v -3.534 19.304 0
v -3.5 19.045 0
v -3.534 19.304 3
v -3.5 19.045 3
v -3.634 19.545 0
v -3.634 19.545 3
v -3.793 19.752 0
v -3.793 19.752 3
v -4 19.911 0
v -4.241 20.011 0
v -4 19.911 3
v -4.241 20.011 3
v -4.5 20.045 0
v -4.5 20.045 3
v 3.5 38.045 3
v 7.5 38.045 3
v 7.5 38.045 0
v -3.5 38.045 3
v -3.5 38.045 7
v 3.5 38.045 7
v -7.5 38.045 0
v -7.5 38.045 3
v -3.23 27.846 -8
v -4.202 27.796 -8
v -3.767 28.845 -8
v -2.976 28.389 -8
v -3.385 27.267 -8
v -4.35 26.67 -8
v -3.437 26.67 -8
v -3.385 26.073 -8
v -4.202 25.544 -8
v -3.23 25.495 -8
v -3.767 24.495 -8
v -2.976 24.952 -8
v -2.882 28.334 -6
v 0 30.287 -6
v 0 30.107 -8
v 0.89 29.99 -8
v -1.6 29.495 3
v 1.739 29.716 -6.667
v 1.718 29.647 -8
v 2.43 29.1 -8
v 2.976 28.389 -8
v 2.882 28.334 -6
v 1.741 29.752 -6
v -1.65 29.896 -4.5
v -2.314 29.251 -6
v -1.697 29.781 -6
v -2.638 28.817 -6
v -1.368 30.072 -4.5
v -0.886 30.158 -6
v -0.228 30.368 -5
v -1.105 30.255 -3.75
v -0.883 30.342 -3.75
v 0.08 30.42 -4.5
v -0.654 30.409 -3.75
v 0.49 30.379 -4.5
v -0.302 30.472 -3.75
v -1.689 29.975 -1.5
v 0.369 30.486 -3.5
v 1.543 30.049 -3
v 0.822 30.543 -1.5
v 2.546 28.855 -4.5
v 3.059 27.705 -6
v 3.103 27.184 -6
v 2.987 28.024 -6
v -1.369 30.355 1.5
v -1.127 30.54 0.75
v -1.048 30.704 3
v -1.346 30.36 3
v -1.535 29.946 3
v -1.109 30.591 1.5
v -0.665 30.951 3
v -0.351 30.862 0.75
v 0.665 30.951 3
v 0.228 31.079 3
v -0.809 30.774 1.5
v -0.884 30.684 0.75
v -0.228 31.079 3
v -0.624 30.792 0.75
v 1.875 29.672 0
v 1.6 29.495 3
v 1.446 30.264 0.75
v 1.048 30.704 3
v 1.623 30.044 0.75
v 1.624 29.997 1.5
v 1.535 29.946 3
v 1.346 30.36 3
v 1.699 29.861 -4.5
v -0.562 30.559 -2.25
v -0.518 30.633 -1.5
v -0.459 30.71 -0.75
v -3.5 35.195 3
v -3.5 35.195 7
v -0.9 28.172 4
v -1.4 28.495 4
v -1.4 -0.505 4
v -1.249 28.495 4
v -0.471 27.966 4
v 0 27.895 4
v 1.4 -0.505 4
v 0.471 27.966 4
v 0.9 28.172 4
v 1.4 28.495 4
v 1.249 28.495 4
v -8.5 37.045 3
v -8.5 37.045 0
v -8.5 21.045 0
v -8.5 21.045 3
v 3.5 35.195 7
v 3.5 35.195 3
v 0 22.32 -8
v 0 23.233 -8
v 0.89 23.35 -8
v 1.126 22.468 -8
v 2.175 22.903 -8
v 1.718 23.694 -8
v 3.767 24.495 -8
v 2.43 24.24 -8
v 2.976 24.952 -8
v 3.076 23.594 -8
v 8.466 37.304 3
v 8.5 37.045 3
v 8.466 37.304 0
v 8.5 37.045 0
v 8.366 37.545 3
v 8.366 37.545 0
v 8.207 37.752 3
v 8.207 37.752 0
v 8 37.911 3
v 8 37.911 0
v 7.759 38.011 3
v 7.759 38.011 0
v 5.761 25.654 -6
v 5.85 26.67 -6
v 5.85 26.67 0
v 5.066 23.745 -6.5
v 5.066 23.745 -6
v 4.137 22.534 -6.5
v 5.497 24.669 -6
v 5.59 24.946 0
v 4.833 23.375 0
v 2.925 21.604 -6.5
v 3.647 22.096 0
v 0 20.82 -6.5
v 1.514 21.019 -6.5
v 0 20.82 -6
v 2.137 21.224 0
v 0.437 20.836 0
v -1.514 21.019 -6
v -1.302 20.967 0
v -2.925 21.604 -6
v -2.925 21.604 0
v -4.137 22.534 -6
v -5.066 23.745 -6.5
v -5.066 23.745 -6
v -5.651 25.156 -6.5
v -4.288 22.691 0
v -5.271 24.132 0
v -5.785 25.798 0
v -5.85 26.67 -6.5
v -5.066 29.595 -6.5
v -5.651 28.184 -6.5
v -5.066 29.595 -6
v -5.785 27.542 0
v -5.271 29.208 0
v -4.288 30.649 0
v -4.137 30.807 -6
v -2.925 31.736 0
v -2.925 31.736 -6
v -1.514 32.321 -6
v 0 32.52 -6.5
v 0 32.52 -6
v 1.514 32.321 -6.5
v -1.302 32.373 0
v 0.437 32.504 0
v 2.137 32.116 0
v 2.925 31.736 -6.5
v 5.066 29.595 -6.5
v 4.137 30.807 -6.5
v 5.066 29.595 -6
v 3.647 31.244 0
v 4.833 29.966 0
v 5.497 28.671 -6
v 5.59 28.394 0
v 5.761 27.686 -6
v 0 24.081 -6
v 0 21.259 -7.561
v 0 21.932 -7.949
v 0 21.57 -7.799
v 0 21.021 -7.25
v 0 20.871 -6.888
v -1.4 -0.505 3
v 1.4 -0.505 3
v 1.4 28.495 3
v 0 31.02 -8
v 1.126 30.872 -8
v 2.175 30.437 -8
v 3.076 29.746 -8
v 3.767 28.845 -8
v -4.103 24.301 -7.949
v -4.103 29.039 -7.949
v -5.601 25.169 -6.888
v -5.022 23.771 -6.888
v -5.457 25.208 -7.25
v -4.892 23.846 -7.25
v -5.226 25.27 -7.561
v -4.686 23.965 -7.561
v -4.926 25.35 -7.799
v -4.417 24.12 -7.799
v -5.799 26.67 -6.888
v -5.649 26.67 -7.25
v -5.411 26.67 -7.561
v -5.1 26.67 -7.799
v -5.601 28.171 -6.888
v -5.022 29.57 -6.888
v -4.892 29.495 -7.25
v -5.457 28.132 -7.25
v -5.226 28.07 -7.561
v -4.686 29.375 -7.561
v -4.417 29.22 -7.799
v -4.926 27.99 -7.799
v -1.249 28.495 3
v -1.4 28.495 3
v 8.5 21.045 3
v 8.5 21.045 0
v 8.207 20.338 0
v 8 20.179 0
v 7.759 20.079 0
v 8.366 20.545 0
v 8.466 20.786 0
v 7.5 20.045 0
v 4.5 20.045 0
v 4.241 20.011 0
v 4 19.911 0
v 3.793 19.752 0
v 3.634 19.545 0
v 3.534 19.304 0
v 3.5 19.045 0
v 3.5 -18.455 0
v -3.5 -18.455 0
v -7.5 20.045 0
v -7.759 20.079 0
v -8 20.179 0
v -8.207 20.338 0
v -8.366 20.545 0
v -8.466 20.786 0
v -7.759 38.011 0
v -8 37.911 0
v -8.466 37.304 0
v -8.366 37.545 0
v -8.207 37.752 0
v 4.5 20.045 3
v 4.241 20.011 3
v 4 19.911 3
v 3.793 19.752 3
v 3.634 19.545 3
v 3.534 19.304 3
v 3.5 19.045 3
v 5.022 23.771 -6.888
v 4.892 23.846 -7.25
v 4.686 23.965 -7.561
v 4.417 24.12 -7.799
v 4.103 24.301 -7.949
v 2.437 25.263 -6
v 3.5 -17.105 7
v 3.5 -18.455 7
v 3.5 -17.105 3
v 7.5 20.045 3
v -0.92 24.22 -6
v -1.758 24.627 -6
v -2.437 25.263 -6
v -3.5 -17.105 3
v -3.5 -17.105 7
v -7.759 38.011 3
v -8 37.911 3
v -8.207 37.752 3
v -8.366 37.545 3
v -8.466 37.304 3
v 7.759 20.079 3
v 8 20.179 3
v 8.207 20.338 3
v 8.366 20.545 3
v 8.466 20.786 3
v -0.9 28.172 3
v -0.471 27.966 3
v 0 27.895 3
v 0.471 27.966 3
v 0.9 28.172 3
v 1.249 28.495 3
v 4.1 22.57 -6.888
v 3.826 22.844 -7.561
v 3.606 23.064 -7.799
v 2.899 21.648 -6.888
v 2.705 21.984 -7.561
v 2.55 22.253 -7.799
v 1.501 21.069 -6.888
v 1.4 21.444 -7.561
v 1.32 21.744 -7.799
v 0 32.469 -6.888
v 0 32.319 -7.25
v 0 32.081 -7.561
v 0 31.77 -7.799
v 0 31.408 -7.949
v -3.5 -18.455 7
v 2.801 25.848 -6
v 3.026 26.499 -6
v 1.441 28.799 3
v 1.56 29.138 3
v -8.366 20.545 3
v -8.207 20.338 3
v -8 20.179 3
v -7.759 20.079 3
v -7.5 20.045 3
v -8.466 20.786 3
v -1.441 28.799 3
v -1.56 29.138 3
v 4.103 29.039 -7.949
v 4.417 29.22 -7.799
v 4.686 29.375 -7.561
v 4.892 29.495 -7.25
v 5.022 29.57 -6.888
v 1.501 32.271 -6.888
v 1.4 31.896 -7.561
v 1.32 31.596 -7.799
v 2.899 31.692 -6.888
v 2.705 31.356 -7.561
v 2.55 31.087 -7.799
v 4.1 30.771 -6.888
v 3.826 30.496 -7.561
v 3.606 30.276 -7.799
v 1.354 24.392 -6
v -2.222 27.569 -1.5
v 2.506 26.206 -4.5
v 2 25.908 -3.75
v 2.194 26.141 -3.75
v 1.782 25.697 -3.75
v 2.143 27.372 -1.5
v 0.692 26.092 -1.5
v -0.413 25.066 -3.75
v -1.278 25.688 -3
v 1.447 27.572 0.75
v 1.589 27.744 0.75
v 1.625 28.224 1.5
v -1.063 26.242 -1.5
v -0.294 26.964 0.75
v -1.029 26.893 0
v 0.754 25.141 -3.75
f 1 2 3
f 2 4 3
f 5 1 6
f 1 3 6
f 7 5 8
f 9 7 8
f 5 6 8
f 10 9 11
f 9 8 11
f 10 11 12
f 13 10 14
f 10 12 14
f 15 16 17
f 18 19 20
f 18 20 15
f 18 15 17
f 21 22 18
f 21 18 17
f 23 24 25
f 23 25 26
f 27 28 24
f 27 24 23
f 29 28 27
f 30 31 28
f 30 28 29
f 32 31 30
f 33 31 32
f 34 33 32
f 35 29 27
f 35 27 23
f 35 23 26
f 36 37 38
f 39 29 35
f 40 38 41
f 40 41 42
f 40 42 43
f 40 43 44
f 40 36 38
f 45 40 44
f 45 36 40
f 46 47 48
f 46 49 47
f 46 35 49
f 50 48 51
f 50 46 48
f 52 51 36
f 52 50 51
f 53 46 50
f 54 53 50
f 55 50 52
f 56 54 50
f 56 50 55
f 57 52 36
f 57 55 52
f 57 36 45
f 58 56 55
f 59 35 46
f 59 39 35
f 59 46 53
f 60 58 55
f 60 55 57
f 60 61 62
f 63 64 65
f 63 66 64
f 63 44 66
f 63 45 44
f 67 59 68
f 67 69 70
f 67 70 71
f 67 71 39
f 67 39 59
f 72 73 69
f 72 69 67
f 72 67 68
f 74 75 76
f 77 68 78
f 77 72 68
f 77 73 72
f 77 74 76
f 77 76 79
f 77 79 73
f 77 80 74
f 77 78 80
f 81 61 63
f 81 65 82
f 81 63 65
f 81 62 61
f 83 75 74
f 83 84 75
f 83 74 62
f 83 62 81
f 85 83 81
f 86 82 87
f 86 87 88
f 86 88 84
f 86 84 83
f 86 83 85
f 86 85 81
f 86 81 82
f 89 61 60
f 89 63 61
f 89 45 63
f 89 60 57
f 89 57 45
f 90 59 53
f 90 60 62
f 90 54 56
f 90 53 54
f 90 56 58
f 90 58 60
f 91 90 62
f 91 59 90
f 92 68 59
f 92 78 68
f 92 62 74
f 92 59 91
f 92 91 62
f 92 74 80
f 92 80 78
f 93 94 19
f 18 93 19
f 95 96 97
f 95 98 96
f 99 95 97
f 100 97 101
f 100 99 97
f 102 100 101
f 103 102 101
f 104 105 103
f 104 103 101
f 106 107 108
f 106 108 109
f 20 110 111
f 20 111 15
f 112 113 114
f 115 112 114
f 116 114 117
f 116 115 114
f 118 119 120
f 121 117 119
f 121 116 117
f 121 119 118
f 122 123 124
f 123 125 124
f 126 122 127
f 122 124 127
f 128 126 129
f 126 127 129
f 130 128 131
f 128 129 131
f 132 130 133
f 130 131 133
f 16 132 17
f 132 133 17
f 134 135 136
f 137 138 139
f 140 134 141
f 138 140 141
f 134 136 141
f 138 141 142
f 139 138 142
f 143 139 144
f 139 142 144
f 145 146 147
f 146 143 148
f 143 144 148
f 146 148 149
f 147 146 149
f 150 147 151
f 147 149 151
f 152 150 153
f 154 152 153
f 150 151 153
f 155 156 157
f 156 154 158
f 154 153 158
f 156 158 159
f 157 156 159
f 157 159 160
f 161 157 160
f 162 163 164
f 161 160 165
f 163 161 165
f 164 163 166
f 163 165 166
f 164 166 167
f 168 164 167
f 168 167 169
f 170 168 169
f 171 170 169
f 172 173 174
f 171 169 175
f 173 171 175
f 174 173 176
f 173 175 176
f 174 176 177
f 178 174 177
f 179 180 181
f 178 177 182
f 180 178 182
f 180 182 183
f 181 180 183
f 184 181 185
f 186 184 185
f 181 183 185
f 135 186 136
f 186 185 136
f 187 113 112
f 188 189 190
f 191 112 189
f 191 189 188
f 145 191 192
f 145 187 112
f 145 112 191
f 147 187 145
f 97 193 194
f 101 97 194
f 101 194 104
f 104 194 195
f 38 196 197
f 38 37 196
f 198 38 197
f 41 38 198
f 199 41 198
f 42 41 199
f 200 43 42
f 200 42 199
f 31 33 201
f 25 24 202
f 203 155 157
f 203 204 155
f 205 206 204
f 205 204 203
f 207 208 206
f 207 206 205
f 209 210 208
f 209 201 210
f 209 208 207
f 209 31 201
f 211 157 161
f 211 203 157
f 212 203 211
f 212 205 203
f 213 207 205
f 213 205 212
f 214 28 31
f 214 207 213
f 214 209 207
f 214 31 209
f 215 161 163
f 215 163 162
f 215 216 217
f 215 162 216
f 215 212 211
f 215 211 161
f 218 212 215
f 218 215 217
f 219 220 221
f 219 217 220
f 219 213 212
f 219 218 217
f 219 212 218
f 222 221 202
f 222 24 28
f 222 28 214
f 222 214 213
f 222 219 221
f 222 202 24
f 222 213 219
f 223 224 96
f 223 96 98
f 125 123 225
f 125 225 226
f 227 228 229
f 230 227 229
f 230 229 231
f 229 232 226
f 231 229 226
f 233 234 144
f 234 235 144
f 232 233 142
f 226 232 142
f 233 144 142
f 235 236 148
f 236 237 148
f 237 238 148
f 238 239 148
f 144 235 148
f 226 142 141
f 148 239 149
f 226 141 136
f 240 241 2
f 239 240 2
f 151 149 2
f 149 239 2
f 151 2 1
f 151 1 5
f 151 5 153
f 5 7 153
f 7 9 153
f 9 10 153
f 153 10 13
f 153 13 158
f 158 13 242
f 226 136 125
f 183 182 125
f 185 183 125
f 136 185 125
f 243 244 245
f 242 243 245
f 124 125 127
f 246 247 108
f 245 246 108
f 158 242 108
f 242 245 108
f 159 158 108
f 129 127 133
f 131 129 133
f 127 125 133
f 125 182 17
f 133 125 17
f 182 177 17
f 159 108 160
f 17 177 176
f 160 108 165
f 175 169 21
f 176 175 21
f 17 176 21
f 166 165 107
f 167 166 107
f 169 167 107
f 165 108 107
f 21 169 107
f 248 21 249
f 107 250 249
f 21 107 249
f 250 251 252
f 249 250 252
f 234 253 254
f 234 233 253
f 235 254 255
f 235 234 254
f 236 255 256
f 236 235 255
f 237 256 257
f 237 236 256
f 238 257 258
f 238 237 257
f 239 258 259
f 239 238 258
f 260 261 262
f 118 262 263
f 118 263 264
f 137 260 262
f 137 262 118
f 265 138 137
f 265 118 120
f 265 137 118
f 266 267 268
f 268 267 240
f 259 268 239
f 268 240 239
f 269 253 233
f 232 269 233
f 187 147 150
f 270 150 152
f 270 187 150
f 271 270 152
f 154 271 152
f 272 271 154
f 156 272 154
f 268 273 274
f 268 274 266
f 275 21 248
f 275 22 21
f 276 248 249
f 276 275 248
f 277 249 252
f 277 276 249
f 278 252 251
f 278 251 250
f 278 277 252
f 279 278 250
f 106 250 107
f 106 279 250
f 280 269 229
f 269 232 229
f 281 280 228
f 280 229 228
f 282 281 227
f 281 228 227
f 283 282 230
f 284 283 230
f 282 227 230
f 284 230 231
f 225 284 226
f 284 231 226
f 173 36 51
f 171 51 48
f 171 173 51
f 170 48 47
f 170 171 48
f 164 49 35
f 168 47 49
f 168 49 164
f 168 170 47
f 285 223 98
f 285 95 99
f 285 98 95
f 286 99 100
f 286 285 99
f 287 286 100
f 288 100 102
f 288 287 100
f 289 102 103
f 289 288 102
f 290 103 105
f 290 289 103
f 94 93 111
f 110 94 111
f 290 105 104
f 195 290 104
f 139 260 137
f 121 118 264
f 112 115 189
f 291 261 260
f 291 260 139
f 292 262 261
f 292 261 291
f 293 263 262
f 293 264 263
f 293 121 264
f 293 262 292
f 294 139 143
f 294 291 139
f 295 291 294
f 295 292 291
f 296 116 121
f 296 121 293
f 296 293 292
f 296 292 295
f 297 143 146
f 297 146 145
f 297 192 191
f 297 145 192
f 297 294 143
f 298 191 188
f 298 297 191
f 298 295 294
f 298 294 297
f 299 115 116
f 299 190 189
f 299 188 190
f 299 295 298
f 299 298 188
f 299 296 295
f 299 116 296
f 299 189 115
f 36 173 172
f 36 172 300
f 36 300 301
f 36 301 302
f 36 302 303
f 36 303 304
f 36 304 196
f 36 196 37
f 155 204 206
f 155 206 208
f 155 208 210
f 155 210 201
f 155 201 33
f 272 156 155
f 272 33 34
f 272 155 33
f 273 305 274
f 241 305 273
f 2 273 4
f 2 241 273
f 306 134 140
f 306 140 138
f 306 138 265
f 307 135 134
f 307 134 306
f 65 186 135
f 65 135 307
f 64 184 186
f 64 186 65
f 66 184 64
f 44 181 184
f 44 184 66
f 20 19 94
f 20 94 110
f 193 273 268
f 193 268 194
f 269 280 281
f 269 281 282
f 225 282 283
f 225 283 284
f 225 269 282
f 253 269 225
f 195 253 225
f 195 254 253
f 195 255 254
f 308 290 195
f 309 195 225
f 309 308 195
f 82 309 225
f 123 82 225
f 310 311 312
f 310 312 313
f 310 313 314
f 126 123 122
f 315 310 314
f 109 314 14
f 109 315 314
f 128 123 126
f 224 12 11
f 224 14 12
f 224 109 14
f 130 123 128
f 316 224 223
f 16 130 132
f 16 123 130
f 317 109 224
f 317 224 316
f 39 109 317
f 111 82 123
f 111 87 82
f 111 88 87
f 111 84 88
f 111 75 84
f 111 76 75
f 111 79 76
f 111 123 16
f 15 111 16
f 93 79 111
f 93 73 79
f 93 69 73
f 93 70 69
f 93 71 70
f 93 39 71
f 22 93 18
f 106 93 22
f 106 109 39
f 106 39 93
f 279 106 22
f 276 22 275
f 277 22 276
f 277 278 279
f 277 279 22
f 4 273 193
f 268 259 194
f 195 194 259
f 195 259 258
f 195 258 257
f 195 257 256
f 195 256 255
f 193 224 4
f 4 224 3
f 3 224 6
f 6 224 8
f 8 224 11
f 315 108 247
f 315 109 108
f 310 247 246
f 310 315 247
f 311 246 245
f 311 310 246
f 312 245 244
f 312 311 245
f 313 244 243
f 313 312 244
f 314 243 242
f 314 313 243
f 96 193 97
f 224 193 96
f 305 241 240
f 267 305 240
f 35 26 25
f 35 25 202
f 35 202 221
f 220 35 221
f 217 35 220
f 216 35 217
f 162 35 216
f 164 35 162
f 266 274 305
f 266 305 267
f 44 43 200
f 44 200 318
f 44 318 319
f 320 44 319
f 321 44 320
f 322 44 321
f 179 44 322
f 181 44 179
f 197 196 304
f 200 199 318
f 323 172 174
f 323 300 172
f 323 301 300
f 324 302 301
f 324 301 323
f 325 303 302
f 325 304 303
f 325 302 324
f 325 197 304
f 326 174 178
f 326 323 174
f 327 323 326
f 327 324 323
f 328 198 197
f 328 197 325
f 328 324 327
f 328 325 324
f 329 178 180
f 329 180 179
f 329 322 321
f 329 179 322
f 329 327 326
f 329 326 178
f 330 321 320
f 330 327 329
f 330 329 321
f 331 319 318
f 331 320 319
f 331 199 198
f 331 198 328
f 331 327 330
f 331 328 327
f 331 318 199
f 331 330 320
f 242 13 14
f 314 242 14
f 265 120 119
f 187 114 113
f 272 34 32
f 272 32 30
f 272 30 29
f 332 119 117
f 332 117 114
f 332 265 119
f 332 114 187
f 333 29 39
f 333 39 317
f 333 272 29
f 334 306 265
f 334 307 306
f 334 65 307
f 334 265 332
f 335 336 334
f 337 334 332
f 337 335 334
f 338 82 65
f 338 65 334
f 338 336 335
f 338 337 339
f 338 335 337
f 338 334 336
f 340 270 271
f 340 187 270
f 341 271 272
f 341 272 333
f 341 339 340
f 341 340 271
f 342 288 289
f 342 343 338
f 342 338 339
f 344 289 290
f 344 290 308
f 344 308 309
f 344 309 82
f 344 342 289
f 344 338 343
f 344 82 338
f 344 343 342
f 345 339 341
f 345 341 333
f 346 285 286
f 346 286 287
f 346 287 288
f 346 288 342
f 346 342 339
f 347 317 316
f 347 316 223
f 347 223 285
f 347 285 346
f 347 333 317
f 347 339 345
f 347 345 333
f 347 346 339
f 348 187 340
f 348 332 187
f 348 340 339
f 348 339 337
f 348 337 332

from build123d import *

# Parameters (mm, degrees)
SKETCH1_W           = 7
SKETCH1_H           = 56.5
BOSS_EXTRUDE1_DEPTH = 3
SKETCH2_W           = 2.8
SKETCH2_H           = 29
BOSS_EXTRUDE2_DEPTH = 1
SKETCH3_W           = 7
SKETCH3_H           = 2.85
SKETCH3_H_2         = 1.35
BOSS_EXTRUDE3_DEPTH = 4
SKETCH4_W           = 3
SKETCH4_H           = 18
BOSS_EXTRUDE4_DEPTH = 5
SKETCH5_W           = 3
SKETCH5_H           = 18
BOSS_EXTRUDE5_DEPTH = 5
SKETCH9_R           = 5.85
BOSS_EXTRUDE7_DEPTH = 8
FILLET1_R           = 1.5
FILLET2_R           = 1
SKETCH11_R          = 3.436863838
SKETCH7_R           = 1.6
CUT_EXTRUDE5_START  = -2
CUT_EXTRUDE5_DEPTH  = 2
SKETCH14_R          = 1.6
CUT_EXTRUDE6_DEPTH  = 3


with BuildPart() as part:
    # Sketch1 → Boss-Extrude1 (new body)
    with BuildSketch(Plane.XY):
        with Locations((0, 9.795104227)):
            Rectangle(SKETCH1_W, SKETCH1_H)
    extrude(amount=BOSS_EXTRUDE1_DEPTH)

    # Sketch2 → Boss-Extrude2 (add)
    with BuildSketch(Plane.XY.offset(3)):
        with Locations((0, 13.995104227)):
            Rectangle(SKETCH2_W, SKETCH2_H)
    extrude(amount=BOSS_EXTRUDE2_DEPTH)

    # Sketch3 → Boss-Extrude3 (add)
    with BuildSketch(Plane.XY.offset(3)):
        with Locations((0, 36.620104227)):
            Rectangle(SKETCH3_W, SKETCH3_H)
        with Locations((0, -17.779895773)):
            Rectangle(SKETCH3_W, SKETCH3_H_2)
    extrude(amount=BOSS_EXTRUDE3_DEPTH)

    # Sketch4 → Boss-Extrude4 (add)
    with BuildSketch(Plane.ZY.offset(3.5)):
        with Locations((1.5, 29.045104227)):
            Rectangle(SKETCH4_W, SKETCH4_H)
    extrude(amount=BOSS_EXTRUDE4_DEPTH)

    # Sketch5 → Boss-Extrude5 (add)
    with BuildSketch(Plane(origin=(3.5, 0, 0), x_dir=(0, 0, -1), z_dir=(1, 0, 0))):
        with Locations((-1.5, 29.045104227)):
            Rectangle(SKETCH5_W, SKETCH5_H)
    extrude(amount=BOSS_EXTRUDE5_DEPTH)

    # Sketch9 → Boss-Extrude7 (add)
    with BuildSketch(Plane(origin=(0, 0, 0), x_dir=(-1, 0, 0), z_dir=(0, 0, -1))):
        with Locations(Location((0, 26.670104227, 0), (0, 0, 180))):
            Circle(SKETCH9_R)
    extrude(amount=BOSS_EXTRUDE7_DEPTH)

    # Fillet1
    fillet1_edges = [part.edges().sort_by_distance(p)[0] for p in [
        (-5.85, 26.670104227, -8),
    ]]
    fillet(fillet1_edges, radius=FILLET1_R)

    # Fillet2
    fillet2_edges = [part.edges().sort_by_distance(p)[0] for p in [
        (-3.5, 20.045104227, 1.5),
        (-8.5, 20.045104227, 1.5),
        (-8.5, 38.045104227, 1.5),
        (3.5, 20.045104227, 1.5),
        (8.5, 38.045104227, 1.5),
        (8.5, 20.045104227, 1.5),
    ]]
    fillet(fillet2_edges, radius=FILLET2_R)

    # Sketch11 → Cut-Loft6 section 0
    with BuildSketch(Plane(origin=(0, 0, -8), x_dir=(-1, 0, 0), z_dir=(0, 0, -1))):
        with Locations((0, 26.670104227)):
            Circle(SKETCH11_R)
    # Sketch7 → Cut-Loft6 section 1
    with BuildSketch(Plane.XY.offset(3)):
        with Locations((0, 29.495104227)):
            Circle(SKETCH7_R)
    loft(mode=Mode.SUBTRACT)

    # Sketch10 → Cut-Extrude5 (cut)
    with BuildSketch(Plane(origin=(0, 0, -8), x_dir=(-1, 0, 0), z_dir=(0, 0, -1)).offset(CUT_EXTRUDE5_START)):
        with BuildLine():
            ThreePointArc((5.066248612, 29.595104227), (2.925, 31.736352839), (0, 32.520104227))
            Line((0, 32.520104227), (0, 26.670104227))
            Line((0, 26.670104227), (5.066248612, 29.595104227))
        make_face()
        with BuildLine():
            Line((5.066248612, 23.745104227), (0, 26.670104227))
            Line((0, 26.670104227), (0, 20.820104227))
            ThreePointArc((0, 20.820104227), (2.925, 21.603855615), (5.066248612, 23.745104227))
        make_face()
        with BuildLine():
            Line((-5.066248612, 23.745104227), (0, 26.670104227))
            Line((0, 26.670104227), (-5.066248612, 29.595104227))
            ThreePointArc((-5.066248612, 29.595104227), (-5.85, 26.670104227), (-5.066248612, 23.745104227))
        make_face()
    extrude(amount=CUT_EXTRUDE5_DEPTH, mode=Mode.SUBTRACT)

    # Sketch14 → Cut-Extrude6 (cut)
    with BuildSketch(Plane.XY.offset(3)):
        with Locations((0, 29.495104227)):
            Circle(SKETCH14_R)
    extrude(amount=CUT_EXTRUDE6_DEPTH, mode=Mode.SUBTRACT)


solid = part.part
